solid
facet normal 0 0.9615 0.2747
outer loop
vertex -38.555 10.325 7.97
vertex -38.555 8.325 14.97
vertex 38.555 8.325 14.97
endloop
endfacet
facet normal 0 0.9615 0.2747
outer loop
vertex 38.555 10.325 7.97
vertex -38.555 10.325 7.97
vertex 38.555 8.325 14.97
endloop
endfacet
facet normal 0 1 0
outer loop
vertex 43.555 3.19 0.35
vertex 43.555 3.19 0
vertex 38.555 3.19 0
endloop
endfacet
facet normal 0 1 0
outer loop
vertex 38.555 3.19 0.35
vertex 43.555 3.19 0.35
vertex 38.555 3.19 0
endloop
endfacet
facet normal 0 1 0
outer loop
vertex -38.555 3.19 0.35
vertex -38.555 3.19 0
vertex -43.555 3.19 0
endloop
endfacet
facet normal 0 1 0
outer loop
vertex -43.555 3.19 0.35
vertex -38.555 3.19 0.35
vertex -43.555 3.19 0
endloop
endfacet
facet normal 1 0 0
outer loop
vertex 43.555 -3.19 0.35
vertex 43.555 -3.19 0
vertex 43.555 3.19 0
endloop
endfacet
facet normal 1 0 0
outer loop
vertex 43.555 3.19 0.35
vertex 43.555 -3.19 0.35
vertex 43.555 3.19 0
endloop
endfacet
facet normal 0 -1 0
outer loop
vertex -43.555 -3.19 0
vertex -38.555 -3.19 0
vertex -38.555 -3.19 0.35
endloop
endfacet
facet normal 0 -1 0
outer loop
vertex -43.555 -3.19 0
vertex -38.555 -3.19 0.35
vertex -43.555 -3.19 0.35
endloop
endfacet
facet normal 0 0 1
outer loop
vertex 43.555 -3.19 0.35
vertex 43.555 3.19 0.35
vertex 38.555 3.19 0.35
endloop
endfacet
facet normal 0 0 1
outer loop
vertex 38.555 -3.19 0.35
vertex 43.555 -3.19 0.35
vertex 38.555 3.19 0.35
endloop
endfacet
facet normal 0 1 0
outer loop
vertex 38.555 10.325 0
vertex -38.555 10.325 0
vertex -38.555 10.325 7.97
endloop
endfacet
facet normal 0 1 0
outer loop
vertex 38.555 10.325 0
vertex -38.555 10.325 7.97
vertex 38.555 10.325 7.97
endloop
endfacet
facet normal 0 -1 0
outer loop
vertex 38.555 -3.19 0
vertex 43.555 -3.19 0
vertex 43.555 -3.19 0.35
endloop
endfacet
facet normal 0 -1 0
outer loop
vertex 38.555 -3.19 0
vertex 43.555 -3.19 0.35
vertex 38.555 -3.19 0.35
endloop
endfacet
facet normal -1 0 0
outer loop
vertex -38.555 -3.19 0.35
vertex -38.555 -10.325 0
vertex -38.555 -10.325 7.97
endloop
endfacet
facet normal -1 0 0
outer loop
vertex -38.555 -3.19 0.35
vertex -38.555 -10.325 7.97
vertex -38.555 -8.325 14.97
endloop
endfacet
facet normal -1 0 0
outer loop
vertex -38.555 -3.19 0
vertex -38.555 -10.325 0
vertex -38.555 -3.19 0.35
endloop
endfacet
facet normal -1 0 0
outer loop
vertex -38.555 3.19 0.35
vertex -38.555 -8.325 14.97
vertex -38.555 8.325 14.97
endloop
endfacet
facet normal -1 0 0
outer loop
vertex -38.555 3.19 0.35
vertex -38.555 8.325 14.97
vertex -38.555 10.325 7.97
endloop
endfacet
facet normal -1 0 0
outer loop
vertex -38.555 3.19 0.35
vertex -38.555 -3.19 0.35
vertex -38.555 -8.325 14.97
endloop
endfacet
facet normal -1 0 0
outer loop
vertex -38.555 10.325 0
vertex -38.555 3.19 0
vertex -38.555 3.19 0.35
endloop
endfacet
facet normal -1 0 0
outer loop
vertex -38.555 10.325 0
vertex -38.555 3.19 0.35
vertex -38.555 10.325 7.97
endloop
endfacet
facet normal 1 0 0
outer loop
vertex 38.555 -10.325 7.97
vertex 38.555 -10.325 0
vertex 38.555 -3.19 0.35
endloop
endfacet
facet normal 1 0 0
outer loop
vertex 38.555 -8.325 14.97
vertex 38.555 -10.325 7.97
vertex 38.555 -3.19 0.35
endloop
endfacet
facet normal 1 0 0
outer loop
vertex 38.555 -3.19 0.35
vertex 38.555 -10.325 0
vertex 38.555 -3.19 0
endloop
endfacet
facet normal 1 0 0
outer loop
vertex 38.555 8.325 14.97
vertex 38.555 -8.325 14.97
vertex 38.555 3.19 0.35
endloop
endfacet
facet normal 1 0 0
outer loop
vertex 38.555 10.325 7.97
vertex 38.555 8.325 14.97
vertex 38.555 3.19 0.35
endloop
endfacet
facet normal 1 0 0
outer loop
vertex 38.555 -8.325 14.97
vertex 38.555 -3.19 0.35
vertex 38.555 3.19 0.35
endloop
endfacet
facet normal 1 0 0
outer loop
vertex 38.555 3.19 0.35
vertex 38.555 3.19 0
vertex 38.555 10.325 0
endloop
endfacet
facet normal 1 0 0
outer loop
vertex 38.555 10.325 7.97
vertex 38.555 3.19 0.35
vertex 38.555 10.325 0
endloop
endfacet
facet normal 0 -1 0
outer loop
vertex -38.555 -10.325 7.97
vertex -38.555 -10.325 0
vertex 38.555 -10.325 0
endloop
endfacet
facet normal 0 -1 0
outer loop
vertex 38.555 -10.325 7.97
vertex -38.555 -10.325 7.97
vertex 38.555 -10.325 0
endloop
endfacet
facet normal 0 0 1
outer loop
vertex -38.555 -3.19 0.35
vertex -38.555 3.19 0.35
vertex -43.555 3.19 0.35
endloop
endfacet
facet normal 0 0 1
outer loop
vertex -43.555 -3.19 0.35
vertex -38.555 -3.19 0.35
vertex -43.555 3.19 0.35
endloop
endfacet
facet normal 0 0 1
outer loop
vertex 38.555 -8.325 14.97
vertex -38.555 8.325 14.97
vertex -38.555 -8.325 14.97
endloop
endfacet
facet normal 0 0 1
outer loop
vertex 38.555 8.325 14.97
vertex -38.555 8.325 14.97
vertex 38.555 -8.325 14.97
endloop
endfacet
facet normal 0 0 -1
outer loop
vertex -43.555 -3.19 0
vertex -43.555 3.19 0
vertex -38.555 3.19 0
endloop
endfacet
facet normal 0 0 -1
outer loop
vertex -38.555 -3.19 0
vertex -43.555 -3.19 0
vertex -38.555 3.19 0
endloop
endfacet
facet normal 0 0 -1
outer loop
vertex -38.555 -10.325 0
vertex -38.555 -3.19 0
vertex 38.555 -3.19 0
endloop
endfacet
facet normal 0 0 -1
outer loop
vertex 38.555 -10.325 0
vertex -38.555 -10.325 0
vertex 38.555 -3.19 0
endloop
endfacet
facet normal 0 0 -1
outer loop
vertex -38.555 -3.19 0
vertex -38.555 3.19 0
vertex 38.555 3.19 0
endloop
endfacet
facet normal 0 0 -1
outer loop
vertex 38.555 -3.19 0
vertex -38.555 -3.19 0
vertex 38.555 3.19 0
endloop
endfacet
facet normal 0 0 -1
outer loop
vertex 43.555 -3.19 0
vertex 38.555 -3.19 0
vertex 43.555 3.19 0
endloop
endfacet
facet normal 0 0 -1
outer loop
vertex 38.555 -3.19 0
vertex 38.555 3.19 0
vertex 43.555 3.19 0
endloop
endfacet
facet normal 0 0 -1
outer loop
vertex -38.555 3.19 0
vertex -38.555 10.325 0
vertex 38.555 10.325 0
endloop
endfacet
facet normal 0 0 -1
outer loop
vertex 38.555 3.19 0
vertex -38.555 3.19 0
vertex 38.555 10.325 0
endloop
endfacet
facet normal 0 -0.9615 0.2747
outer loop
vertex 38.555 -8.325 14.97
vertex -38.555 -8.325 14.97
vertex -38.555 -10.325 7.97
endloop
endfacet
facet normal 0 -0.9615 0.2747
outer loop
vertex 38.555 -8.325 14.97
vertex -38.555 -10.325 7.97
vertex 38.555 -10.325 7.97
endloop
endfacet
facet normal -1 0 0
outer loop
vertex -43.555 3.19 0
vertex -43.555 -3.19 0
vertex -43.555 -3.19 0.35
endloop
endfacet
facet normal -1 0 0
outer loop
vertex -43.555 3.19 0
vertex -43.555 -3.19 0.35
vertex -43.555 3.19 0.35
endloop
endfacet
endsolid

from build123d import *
from OCP.BRepFilletAPI import BRepFilletAPI_MakeChamfer

# Parameters (mm, degrees)
SKETCH1_W           = 77.11
SKETCH1_H           = 20.65
BOSS_EXTRUDE1_DEPTH = 14.97
CHAMFER1_SIZE       = 7
CHAMFER1_SIZE2      = 2
SKETCH2_W           = 5
SKETCH2_H           = 6.38
BOSS_EXTRUDE2_DEPTH = 0.35


with BuildPart() as part:
    # Sketch1 → Boss-Extrude1 (new body)
    with BuildSketch(Plane.XY):
        Rectangle(SKETCH1_W, SKETCH1_H)
    extrude(amount=BOSS_EXTRUDE1_DEPTH)

    # Chamfer1: one chamfer whose edges measure the first distance from different faces: ONE call of the kernel's chamfer builder (chamfer() names one face for all edges)
    chamfer1_edges_1 = [part.edges().sort_by_distance(p)[0] for p in [
        (0, -10.325, 14.97),
    ]]
    chamfer1_side_1 = [part.faces().sort_by_distance(p)[0] for p in [
        (0, -10.325, 7.485),
    ]]
    chamfer1_edges_2 = [part.edges().sort_by_distance(p)[0] for p in [
        (0, 10.325, 14.97),
    ]]
    chamfer1_side_2 = [part.faces().sort_by_distance(p)[0] for p in [
        (0, 10.325, 7.485),
    ]]
    chamfer1 = BRepFilletAPI_MakeChamfer(part.part.solid().wrapped)
    for e in chamfer1_edges_1:
        chamfer1.Add(CHAMFER1_SIZE, CHAMFER1_SIZE2, e.wrapped, chamfer1_side_1[0].wrapped)  # the first distance lies on this face
    for e in chamfer1_edges_2:
        chamfer1.Add(CHAMFER1_SIZE, CHAMFER1_SIZE2, e.wrapped, chamfer1_side_2[0].wrapped)  # the first distance lies on this face
    add(Compound.cast(chamfer1.Shape()), mode=Mode.REPLACE)

    # Sketch2 → Boss-Extrude2 (add)
    with BuildSketch(Plane(origin=(0, 0, 0), x_dir=(-1, 0, 0), z_dir=(0, 0, -1))):
        with Locations((-41.055, 0)):
            Rectangle(SKETCH2_W, SKETCH2_H)
        with Locations((41.055, 0)):
            Rectangle(SKETCH2_W, SKETCH2_H)
    extrude(amount=-BOSS_EXTRUDE2_DEPTH)


solid = part.part
